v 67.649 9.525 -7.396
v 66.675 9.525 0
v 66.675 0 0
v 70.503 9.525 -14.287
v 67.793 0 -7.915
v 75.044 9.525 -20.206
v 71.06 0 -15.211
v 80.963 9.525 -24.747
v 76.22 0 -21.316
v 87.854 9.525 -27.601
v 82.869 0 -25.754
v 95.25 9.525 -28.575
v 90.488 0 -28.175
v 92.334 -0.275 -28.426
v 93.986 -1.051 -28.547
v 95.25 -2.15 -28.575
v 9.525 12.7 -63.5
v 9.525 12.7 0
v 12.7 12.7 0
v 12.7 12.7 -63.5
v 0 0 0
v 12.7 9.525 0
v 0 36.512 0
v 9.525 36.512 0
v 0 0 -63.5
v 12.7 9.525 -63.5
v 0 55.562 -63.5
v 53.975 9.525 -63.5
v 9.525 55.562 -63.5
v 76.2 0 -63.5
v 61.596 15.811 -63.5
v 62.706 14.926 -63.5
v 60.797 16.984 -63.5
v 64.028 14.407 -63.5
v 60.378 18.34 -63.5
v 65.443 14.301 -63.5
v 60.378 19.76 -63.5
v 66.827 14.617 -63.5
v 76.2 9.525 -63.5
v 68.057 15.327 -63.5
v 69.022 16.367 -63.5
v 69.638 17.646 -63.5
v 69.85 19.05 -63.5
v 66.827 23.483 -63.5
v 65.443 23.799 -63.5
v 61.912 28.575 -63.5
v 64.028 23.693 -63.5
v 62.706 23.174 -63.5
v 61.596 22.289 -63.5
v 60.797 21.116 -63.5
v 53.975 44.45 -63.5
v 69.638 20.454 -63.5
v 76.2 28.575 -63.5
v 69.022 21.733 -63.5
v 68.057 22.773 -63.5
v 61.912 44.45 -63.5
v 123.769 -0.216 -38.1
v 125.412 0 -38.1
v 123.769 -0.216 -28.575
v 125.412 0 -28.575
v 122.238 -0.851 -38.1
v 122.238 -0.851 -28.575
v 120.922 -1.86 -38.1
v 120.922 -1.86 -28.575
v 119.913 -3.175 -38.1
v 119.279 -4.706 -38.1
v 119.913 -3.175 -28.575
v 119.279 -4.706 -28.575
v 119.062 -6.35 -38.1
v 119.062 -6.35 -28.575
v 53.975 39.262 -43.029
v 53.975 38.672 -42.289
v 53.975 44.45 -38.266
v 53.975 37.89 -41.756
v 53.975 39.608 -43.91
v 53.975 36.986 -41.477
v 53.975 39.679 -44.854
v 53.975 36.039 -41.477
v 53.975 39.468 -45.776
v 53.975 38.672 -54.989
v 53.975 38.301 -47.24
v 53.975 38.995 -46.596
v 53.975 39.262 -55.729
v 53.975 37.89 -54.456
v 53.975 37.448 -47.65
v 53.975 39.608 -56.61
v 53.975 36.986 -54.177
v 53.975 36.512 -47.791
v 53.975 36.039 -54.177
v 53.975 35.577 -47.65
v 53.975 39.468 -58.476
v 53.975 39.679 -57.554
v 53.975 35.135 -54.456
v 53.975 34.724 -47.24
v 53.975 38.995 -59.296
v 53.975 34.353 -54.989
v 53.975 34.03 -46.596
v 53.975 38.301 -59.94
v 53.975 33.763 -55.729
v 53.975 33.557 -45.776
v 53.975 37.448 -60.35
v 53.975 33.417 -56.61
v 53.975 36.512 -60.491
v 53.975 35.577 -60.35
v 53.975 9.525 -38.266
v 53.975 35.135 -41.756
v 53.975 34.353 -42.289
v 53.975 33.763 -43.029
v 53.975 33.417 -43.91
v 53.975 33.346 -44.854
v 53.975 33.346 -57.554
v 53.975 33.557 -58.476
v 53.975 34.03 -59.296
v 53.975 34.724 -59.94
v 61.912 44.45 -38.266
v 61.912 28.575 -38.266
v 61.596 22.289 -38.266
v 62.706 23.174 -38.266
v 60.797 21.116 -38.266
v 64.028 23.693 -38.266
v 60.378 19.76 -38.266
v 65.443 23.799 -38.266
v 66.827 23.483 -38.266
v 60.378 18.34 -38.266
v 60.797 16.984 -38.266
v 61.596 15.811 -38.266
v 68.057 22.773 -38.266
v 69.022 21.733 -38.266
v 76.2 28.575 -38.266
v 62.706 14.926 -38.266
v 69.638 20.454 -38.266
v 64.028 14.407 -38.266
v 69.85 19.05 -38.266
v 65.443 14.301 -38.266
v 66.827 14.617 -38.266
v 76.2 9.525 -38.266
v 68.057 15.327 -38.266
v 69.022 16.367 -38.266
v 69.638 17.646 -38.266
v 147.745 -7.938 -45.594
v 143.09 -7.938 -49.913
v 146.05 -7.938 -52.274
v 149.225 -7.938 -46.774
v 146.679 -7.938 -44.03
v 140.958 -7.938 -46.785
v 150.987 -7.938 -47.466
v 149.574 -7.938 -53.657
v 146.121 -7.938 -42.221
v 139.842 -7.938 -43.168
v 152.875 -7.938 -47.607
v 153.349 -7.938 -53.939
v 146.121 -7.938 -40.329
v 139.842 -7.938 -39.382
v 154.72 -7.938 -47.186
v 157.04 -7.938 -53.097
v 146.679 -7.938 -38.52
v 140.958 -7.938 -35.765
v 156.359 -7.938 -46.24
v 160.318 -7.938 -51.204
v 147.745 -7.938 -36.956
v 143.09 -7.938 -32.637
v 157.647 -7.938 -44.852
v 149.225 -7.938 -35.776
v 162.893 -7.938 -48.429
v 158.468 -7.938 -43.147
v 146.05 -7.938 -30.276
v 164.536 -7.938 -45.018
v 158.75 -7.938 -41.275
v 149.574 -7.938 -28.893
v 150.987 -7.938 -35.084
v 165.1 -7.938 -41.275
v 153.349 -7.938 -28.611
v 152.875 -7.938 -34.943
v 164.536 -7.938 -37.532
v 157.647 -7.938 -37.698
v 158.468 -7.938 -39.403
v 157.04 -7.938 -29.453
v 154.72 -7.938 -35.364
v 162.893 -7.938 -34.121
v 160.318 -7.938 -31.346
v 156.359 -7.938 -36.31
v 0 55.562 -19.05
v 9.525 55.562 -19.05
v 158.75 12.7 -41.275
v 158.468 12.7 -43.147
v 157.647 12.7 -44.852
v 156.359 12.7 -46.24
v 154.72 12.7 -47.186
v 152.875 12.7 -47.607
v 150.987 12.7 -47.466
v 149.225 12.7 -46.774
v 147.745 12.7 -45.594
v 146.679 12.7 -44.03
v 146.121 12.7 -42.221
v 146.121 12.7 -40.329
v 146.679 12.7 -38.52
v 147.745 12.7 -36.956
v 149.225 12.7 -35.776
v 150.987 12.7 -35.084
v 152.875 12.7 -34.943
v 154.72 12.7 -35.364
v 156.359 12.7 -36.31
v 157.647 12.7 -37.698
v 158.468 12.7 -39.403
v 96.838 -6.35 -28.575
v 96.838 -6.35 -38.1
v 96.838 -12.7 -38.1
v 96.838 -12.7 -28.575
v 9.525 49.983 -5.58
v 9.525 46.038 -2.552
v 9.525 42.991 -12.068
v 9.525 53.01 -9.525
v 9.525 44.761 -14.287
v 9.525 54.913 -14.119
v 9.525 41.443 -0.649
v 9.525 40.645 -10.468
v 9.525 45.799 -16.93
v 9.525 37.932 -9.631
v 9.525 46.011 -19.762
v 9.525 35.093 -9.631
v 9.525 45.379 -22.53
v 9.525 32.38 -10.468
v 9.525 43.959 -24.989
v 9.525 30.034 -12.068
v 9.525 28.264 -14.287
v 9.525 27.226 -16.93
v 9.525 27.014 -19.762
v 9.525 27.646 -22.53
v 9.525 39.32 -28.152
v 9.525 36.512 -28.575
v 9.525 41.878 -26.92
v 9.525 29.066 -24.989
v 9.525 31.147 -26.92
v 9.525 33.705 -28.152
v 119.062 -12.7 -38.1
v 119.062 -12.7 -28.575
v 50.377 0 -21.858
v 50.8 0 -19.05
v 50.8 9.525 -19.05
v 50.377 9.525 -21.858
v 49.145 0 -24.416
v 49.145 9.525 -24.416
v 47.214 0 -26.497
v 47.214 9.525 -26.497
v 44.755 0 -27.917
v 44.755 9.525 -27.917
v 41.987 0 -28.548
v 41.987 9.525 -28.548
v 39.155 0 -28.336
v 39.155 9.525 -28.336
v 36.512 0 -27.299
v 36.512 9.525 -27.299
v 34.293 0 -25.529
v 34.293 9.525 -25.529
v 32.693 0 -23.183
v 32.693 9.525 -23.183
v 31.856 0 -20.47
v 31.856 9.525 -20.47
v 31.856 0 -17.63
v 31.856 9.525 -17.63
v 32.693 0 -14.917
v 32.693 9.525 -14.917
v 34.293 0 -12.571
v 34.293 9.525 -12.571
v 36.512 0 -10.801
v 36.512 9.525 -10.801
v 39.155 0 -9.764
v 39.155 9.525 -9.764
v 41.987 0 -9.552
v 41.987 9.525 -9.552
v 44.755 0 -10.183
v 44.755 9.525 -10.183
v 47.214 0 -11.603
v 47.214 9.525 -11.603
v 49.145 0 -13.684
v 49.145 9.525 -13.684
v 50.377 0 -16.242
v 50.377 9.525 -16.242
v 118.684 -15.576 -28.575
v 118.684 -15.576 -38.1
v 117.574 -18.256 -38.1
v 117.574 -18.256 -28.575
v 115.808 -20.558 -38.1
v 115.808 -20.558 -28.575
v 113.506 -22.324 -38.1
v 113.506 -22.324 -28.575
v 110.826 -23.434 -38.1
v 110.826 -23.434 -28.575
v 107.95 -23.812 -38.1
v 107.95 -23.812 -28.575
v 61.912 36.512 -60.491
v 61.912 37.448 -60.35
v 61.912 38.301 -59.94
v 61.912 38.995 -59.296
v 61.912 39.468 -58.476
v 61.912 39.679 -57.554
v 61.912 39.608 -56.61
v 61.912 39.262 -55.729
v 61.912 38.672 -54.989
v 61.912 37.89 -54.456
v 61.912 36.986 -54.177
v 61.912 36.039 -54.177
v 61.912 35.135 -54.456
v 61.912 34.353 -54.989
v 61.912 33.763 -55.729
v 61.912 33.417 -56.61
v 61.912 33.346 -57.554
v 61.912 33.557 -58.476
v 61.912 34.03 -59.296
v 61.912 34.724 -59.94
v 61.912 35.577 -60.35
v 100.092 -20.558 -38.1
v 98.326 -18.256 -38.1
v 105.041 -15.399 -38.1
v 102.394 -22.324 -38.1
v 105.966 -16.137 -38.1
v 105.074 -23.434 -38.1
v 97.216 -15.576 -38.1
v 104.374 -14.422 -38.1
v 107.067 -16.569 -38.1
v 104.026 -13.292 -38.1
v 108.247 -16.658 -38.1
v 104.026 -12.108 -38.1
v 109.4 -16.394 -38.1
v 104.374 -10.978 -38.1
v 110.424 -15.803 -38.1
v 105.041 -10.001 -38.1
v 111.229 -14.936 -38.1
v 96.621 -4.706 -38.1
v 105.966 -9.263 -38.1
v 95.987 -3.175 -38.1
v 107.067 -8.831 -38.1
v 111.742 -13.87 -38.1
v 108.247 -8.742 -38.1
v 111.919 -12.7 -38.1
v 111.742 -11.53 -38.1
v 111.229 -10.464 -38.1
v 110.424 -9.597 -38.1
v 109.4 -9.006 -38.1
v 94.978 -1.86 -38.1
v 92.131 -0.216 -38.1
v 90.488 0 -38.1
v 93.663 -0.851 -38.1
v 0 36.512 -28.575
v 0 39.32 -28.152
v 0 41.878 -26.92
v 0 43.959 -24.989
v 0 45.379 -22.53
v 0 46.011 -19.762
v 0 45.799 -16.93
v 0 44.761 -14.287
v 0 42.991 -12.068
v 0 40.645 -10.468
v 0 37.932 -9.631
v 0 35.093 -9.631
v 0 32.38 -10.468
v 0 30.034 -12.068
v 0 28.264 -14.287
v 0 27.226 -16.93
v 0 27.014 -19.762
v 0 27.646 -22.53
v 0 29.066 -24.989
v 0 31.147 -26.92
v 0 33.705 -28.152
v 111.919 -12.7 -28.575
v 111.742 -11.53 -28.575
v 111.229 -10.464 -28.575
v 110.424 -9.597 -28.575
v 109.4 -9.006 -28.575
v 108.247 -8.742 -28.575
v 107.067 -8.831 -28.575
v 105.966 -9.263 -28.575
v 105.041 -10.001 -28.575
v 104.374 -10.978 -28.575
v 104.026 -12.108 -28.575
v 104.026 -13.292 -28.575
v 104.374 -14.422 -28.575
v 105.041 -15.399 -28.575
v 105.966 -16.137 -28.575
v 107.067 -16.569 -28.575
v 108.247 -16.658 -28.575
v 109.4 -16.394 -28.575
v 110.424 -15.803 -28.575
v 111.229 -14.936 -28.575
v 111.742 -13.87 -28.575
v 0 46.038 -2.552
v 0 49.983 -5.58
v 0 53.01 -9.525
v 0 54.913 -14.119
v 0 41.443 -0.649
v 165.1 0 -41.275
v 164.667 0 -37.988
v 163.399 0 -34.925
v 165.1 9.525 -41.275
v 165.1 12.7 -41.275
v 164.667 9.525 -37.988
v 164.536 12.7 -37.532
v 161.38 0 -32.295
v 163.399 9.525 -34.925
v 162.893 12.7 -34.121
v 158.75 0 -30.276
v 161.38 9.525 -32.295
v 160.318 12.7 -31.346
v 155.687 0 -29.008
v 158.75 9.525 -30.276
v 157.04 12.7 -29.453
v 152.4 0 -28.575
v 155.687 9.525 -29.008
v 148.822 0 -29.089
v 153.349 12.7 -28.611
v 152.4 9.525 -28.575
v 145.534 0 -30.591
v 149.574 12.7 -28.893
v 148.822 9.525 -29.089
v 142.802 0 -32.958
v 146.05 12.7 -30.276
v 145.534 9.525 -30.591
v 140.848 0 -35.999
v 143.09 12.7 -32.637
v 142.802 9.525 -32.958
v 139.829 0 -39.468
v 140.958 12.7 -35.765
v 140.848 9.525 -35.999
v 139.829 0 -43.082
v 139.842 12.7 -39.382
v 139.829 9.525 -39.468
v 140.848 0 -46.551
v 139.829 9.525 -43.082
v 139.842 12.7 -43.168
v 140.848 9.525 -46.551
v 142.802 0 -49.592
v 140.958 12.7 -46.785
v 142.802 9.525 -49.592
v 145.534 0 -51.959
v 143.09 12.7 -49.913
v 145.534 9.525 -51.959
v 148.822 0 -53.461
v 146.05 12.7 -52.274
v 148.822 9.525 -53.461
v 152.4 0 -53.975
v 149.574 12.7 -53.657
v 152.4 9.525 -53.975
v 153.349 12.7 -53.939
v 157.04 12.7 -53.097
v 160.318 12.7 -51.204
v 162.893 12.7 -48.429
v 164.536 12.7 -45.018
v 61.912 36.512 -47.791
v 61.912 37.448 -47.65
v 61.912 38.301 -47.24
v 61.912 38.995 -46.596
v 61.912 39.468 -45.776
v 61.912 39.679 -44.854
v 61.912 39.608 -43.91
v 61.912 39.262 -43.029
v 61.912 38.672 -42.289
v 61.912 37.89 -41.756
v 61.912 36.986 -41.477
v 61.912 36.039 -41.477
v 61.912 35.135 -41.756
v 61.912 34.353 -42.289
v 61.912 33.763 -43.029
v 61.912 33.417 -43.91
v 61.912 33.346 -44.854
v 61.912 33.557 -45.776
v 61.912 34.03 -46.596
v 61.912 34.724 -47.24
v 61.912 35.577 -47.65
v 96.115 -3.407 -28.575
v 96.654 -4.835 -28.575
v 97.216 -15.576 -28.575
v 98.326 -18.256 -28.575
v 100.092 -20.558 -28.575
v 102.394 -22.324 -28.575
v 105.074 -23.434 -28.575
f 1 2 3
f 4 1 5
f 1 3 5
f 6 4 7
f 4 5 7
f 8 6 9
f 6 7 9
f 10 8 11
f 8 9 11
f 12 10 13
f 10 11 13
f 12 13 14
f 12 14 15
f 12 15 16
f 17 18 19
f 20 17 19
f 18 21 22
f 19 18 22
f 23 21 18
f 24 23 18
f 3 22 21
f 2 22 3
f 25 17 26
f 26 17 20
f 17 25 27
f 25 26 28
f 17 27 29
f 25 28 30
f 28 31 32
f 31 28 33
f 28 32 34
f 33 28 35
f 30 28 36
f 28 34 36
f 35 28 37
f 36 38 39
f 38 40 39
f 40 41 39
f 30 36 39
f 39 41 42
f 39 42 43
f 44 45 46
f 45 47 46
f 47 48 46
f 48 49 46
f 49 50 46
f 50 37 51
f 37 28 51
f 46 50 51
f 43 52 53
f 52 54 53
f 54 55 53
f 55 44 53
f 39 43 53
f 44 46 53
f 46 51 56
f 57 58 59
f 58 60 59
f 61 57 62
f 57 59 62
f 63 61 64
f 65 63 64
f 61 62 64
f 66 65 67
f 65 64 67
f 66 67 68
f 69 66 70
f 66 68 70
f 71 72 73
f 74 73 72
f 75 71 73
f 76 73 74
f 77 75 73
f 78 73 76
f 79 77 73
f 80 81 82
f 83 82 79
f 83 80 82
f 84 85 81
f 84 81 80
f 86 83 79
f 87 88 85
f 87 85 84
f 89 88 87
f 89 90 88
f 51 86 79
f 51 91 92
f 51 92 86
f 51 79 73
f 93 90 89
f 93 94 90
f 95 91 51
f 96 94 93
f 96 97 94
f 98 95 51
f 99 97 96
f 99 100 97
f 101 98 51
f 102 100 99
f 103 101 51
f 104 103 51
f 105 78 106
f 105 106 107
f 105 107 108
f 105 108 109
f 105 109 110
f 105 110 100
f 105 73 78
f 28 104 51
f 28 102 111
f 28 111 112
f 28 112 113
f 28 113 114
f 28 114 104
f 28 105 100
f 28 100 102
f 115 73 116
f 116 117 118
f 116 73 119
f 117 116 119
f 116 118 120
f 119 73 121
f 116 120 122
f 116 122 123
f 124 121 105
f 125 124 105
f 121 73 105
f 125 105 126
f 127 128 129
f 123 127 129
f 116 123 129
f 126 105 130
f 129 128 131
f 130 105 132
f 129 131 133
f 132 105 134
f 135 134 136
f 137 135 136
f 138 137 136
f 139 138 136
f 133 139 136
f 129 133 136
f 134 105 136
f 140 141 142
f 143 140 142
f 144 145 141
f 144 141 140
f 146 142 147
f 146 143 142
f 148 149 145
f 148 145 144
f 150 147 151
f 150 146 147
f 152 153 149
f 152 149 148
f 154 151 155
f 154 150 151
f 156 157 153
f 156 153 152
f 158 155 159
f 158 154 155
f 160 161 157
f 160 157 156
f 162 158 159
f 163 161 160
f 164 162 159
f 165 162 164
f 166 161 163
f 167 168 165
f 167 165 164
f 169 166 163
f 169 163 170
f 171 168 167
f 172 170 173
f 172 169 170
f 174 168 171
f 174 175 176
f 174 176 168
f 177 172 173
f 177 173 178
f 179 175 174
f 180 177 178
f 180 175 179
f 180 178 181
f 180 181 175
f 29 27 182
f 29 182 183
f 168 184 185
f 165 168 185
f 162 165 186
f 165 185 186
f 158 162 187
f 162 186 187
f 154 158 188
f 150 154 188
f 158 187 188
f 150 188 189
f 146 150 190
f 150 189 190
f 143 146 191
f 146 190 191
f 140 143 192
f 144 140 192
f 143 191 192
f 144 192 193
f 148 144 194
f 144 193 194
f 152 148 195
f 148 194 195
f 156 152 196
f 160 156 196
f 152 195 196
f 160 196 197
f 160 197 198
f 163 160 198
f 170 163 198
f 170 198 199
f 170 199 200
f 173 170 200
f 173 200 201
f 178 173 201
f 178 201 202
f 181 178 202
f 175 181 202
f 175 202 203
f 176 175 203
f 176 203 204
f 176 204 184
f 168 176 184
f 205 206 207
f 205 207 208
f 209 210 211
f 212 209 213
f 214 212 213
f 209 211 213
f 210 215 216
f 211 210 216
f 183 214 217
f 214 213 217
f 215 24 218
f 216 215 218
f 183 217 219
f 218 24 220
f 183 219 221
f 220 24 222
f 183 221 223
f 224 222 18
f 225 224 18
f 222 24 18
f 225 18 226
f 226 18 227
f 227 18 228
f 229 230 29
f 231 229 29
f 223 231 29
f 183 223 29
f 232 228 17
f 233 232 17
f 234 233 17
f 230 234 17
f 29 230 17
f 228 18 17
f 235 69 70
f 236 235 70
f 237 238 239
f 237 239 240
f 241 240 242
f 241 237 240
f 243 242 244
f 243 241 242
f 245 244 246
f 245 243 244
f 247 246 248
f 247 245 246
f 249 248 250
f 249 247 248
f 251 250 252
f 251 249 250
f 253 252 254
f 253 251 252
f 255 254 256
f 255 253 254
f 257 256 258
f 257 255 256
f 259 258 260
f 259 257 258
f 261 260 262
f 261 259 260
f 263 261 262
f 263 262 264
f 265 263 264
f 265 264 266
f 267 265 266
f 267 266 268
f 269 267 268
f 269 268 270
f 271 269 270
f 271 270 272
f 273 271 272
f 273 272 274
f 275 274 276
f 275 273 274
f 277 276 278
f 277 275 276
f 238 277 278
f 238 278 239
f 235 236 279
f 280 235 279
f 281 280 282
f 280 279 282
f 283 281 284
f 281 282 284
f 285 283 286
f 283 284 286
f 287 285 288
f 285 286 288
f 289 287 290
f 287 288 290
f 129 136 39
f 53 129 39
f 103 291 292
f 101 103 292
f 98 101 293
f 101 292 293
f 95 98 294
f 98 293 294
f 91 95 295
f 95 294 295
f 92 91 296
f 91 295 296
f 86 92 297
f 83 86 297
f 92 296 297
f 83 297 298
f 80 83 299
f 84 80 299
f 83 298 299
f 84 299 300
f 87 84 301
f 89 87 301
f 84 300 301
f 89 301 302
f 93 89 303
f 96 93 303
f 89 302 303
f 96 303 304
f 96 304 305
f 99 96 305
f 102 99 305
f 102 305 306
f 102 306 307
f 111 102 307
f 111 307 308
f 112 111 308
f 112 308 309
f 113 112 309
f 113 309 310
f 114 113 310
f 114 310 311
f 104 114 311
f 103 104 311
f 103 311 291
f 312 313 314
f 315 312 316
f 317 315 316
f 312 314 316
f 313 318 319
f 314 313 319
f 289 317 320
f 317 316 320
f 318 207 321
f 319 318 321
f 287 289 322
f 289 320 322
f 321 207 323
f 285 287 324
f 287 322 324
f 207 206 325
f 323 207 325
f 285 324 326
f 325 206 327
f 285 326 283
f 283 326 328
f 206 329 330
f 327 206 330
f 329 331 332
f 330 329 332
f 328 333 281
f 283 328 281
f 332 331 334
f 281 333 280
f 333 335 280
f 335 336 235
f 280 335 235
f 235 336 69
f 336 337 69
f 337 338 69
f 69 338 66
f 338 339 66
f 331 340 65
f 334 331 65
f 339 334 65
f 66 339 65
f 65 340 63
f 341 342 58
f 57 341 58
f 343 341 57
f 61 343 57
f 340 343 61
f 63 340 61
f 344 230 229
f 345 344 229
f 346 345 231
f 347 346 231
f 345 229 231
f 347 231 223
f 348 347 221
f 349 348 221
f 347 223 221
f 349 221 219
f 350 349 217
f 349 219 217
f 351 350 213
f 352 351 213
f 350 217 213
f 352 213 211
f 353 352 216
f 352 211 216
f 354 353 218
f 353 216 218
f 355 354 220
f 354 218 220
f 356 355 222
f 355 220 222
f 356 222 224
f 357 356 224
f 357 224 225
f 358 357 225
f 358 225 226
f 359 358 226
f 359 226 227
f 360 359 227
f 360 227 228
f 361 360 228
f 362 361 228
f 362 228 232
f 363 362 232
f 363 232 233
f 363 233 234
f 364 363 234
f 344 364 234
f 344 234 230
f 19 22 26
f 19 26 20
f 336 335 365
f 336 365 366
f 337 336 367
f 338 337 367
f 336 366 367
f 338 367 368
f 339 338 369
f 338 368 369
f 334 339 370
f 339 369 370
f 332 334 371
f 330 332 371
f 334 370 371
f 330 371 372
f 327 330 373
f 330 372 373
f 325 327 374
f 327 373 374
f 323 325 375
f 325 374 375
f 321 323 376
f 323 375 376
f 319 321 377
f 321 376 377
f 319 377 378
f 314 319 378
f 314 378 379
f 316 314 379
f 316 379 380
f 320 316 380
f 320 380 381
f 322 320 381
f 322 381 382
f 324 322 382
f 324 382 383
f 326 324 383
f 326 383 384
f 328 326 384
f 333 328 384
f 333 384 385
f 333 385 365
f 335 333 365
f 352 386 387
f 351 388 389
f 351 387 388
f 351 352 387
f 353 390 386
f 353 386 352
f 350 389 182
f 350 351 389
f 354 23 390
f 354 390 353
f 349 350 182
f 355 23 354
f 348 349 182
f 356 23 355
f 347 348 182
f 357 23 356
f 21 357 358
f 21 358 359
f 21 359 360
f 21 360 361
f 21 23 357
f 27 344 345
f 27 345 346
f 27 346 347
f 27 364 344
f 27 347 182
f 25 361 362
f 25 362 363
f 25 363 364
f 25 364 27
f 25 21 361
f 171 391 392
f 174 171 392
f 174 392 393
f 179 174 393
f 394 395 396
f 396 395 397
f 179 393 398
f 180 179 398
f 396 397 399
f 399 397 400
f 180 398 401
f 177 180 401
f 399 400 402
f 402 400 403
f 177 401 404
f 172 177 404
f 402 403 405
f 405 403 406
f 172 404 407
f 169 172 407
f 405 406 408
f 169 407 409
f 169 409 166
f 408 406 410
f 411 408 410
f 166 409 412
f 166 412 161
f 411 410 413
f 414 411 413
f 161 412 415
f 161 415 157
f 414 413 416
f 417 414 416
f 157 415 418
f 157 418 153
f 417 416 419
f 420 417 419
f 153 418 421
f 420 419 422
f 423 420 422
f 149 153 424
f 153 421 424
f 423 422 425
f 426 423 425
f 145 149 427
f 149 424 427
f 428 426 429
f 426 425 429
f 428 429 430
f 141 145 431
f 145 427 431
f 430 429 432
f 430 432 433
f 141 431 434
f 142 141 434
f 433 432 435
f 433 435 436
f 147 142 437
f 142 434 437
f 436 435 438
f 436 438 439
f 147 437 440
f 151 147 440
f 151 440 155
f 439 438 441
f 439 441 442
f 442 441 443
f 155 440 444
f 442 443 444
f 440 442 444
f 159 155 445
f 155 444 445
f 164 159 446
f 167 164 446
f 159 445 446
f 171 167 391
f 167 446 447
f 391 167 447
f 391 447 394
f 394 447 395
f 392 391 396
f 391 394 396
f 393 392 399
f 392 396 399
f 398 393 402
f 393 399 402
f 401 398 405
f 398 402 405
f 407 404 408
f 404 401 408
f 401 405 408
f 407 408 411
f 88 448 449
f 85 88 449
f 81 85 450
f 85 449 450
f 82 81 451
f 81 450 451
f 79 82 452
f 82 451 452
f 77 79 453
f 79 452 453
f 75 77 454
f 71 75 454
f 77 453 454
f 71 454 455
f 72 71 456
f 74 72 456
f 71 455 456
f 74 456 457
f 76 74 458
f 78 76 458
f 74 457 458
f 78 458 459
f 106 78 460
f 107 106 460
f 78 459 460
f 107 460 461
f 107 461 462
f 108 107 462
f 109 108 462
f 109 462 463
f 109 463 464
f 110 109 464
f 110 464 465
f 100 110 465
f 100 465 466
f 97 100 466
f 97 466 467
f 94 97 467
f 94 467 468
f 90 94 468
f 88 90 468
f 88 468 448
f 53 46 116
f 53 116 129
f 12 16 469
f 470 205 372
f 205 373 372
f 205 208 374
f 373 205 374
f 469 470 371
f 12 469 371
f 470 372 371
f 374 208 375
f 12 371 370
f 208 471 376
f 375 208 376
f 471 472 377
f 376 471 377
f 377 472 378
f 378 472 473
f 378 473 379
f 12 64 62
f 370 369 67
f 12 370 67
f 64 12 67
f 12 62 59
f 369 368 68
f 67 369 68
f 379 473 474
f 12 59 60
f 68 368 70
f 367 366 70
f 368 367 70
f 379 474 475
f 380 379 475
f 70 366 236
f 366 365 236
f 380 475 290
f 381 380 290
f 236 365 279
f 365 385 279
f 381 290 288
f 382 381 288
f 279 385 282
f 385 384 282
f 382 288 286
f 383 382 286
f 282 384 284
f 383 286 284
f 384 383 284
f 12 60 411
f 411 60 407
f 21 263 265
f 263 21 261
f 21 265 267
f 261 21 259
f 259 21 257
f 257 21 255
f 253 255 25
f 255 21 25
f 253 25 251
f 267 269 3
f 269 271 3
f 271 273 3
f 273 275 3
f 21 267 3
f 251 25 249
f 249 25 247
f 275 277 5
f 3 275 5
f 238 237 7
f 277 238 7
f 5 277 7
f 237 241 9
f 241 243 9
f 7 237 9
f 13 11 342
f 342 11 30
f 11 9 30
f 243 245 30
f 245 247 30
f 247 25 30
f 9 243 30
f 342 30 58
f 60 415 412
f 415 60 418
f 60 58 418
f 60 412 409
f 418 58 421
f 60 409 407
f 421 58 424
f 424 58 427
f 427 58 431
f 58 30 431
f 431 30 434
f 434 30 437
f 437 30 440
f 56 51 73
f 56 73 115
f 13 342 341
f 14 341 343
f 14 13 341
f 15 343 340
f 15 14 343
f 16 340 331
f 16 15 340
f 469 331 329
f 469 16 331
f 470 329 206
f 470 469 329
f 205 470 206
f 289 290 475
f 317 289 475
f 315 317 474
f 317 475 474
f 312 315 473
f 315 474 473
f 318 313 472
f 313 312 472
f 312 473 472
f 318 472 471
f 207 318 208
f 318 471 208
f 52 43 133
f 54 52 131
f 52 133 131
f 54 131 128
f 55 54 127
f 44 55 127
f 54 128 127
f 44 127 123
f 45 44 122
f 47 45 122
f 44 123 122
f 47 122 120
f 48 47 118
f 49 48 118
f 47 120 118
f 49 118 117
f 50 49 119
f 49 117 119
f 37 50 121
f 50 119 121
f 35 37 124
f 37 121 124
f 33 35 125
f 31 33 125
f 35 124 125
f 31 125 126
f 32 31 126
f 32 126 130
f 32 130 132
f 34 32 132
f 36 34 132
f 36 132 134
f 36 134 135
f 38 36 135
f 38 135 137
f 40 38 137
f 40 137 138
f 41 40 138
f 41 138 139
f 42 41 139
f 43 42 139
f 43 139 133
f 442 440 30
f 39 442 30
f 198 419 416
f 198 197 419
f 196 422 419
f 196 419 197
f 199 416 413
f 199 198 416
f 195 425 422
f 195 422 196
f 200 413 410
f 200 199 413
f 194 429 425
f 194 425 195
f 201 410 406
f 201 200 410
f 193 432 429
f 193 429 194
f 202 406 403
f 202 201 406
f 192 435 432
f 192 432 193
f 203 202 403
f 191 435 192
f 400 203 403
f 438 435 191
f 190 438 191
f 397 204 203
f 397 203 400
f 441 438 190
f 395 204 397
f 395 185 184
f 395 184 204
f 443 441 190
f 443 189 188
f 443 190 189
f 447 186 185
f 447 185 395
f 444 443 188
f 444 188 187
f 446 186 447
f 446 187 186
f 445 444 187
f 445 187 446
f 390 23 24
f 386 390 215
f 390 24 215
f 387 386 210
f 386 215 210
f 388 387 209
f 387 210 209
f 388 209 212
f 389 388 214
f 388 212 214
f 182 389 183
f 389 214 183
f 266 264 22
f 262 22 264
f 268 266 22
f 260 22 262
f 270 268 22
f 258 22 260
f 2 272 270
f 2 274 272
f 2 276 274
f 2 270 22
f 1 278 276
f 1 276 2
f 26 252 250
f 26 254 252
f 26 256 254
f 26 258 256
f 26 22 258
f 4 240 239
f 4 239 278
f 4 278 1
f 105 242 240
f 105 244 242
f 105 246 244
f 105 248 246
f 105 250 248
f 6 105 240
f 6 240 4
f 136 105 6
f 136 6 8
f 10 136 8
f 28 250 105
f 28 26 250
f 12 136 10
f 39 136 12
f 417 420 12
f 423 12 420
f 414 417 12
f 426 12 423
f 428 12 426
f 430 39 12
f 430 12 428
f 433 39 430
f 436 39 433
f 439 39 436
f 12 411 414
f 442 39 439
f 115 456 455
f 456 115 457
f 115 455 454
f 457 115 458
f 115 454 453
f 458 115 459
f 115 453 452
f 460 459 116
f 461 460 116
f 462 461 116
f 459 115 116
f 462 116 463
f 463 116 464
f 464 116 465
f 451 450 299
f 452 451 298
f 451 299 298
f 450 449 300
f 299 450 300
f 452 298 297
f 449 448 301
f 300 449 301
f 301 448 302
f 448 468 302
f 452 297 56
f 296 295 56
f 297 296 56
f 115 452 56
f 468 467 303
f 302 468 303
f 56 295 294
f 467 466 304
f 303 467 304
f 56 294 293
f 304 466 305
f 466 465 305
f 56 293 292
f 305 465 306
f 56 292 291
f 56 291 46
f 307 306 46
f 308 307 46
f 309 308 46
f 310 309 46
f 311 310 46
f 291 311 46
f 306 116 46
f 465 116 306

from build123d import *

# Parameters (mm, degrees)
CROQUIS1_R              = 9.525
SALIENTE_EXTRUIR1_DEPTH = 9.525
CROQUIS2_W              = 9.525
CROQUIS2_H              = 63.5
SALIENTE_EXTRUIR3_DEPTH = 46.0375
CROQUIS3_R              = 9.525
CORTAR_EXTRUIR1_DEPTH   = 46.0375
CROQUIS4_R              = 12.7
SALIENTE_EXTRUIR4_DEPTH = 3.175
CROQUIS5_W              = 22.225
CROQUIS5_H              = 25.233673581
SALIENTE_EXTRUIR5_DEPTH = 19.05
CROQUIS6_W              = 7.9375
CROQUIS6_H              = 25.233673581
SALIENTE_EXTRUIR6_DEPTH = 15.875
CROQUIS7_R              = 3.175
CORTAR_EXTRUIR2_DEPTH   = 15.875
CROQUIS8_R              = 4.7625
CORTAR_EXTRUIR4_DEPTH   = 26.233673581
CROQUIS9_R              = 12.7
SALIENTE_EXTRUIR7_DEPTH = 7.9375
CROQUIS10_R             = 6.35
CORTAR_EXTRUIR5_DEPTH   = 21.6375
CROQUIS14_W             = 22.225
CROQUIS14_H             = 9.525
SALIENTE_EXTRUIR8_DEPTH = 23.8125
CROQUIS15_R             = 3.96875
CORTAR_EXTRUIR7_DEPTH   = 35.925
REDONDEO6_R             = 6.35
CROQUIS16_W             = 3.175
CROQUIS16_H             = 3.175
SALIENTE_EXTRUIR9_DEPTH = 63.5


with BuildPart() as part:
    # Croquis1 → Saliente-Extruir1 (new body)
    with BuildSketch(Plane(origin=(0, 0, 0), x_dir=(1, 0, 0), z_dir=(0, 1, 0))):
        with BuildLine():
            Line((0, 0), (66.675, 0))
            ThreePointArc((66.675, 0), (75.044423728, 20.205576272), (95.25, 28.575))
            Line((95.25, 28.575), (152.4, 28.575))
            ThreePointArc((152.4, 28.575), (165.1, 41.275), (152.4, 53.975))
            Line((152.4, 53.975), (76.2, 63.5))
            Line((76.2, 63.5), (61.9125, 63.5))
            Line((61.9125, 63.5), (9.525, 63.5))
            Line((9.525, 63.5), (0, 63.5))
            Line((0, 63.5), (0, 0))
        make_face()
        with Locations((41.275, 19.05)):
            Circle(CROQUIS1_R, mode=Mode.SUBTRACT)
    extrude(amount=SALIENTE_EXTRUIR1_DEPTH)

    # Croquis2 → Saliente-Extruir3 (add)
    with BuildSketch(Plane(origin=(0, 9.525, 0), x_dir=(1, 0, 0), z_dir=(0, 1, 0))):
        with Locations((4.7625, 31.75)):
            Rectangle(CROQUIS2_W, CROQUIS2_H)
    extrude(amount=SALIENTE_EXTRUIR3_DEPTH)

    # Croquis3 → Cortar-Extruir1 (cut)
    with BuildSketch(Plane(origin=(9.525, 0, 0), x_dir=(0, 0, -1), z_dir=(1, 0, 0))):
        with Locations((19.05, 36.5125)):
            Circle(CROQUIS3_R)
        with BuildLine():
            Line((0, 55.5625), (0, 36.5125))
            ThreePointArc((0, 36.5125), (5.579615818, 49.982884182), (19.05, 55.5625))
            Line((19.05, 55.5625), (0, 55.5625))
        make_face()
    extrude(amount=-CORTAR_EXTRUIR1_DEPTH, mode=Mode.SUBTRACT)

    # Croquis4 → Saliente-Extruir4 (add)
    with BuildSketch(Plane(origin=(0, 9.525, 0), x_dir=(1, 0, 0), z_dir=(0, 1, 0))):
        with Locations((152.4, 41.275)):
            Circle(CROQUIS4_R)
    extrude(amount=SALIENTE_EXTRUIR4_DEPTH)

    # Croquis5 → Saliente-Extruir5 (add)
    with BuildSketch(Plane(origin=(0, 9.525, 0), x_dir=(1, 0, 0), z_dir=(0, 1, 0))):
        with Locations((65.0875, 50.88316321)):
            Rectangle(CROQUIS5_W, CROQUIS5_H)
    extrude(amount=SALIENTE_EXTRUIR5_DEPTH)

    # Croquis6 → Saliente-Extruir6 (add)
    with BuildSketch(Plane(origin=(0, 28.575, 0), x_dir=(1, 0, 0), z_dir=(0, 1, 0))):
        with Locations((57.94375, 50.88316321)):
            Rectangle(CROQUIS6_W, CROQUIS6_H)
    extrude(amount=SALIENTE_EXTRUIR6_DEPTH)

    # Croquis7 → Cortar-Extruir2 (cut)
    with BuildSketch(Plane(origin=(61.9125, 0, 0), x_dir=(0, 0, -1), z_dir=(1, 0, 0))):
        with Locations((44.616326419, 36.5125)):
            Circle(CROQUIS7_R)
        with Locations((57.316326419, 36.5125)):
            Circle(CROQUIS7_R)
    extrude(amount=-CORTAR_EXTRUIR2_DEPTH, mode=Mode.SUBTRACT)

    # Croquis8 → Cortar-Extruir4 (cut, through all)
    with BuildSketch(Plane.XY.offset(-38.266326419)):
        with Locations((65.0875, 19.05)):
            Circle(CROQUIS8_R)
    extrude(amount=-CORTAR_EXTRUIR4_DEPTH, mode=Mode.SUBTRACT)

    # Croquis9 → Saliente-Extruir7 (add)
    with BuildSketch(Plane.XZ):
        with Locations((152.4, -41.275)):
            Circle(CROQUIS9_R)
    extrude(amount=SALIENTE_EXTRUIR7_DEPTH)

    # Croquis10 → Cortar-Extruir5 (cut, through all)
    with BuildSketch(Plane(origin=(0, 12.7, 0), x_dir=(1, 0, 0), z_dir=(0, 1, 0))):
        with Locations((152.4, 41.275)):
            Circle(CROQUIS10_R)
    extrude(amount=-CORTAR_EXTRUIR5_DEPTH, mode=Mode.SUBTRACT)

    # Croquis14 → Saliente-Extruir8 (add)
    with BuildSketch(Plane.XZ):
        with Locations((107.95, -33.3375)):
            Rectangle(CROQUIS14_W, CROQUIS14_H)
    extrude(amount=SALIENTE_EXTRUIR8_DEPTH)

    # Croquis15 → Cortar-Extruir7 (cut, through all)
    with BuildSketch(Plane.XY.offset(-28.575)):
        with Locations((107.95, -12.7)):
            Circle(CROQUIS15_R)
        with BuildLine():
            ThreePointArc((119.0625, -12.7), (115.807724106, -20.557724106), (107.95, -23.8125))
            Line((107.95, -23.8125), (119.0625, -23.8125))
            Line((119.0625, -23.8125), (119.0625, -12.7))
        make_face()
        with BuildLine():
            ThreePointArc((107.95, -23.8125), (100.092275894, -20.557724106), (96.8375, -12.7))
            Line((96.8375, -12.7), (96.8375, -23.8125))
            Line((96.8375, -23.8125), (107.95, -23.8125))
        make_face()
    extrude(amount=-CORTAR_EXTRUIR7_DEPTH, mode=Mode.SUBTRACT)

    # Redondeo6
    redondeo6_edges = [part.edges().sort_by_distance(p)[0] for p in [
        (119.0625, 0, -33.3375),
        (96.8375, 0, -33.3375),
    ]]
    fillet(redondeo6_edges, radius=REDONDEO6_R)

    # Croquis16 → Saliente-Extruir9 (add)
    with BuildSketch(Plane.XY):
        with Locations((11.1125, 11.1125)):
            Rectangle(CROQUIS16_W, CROQUIS16_H)
    extrude(amount=-SALIENTE_EXTRUIR9_DEPTH)


solid = part.part
